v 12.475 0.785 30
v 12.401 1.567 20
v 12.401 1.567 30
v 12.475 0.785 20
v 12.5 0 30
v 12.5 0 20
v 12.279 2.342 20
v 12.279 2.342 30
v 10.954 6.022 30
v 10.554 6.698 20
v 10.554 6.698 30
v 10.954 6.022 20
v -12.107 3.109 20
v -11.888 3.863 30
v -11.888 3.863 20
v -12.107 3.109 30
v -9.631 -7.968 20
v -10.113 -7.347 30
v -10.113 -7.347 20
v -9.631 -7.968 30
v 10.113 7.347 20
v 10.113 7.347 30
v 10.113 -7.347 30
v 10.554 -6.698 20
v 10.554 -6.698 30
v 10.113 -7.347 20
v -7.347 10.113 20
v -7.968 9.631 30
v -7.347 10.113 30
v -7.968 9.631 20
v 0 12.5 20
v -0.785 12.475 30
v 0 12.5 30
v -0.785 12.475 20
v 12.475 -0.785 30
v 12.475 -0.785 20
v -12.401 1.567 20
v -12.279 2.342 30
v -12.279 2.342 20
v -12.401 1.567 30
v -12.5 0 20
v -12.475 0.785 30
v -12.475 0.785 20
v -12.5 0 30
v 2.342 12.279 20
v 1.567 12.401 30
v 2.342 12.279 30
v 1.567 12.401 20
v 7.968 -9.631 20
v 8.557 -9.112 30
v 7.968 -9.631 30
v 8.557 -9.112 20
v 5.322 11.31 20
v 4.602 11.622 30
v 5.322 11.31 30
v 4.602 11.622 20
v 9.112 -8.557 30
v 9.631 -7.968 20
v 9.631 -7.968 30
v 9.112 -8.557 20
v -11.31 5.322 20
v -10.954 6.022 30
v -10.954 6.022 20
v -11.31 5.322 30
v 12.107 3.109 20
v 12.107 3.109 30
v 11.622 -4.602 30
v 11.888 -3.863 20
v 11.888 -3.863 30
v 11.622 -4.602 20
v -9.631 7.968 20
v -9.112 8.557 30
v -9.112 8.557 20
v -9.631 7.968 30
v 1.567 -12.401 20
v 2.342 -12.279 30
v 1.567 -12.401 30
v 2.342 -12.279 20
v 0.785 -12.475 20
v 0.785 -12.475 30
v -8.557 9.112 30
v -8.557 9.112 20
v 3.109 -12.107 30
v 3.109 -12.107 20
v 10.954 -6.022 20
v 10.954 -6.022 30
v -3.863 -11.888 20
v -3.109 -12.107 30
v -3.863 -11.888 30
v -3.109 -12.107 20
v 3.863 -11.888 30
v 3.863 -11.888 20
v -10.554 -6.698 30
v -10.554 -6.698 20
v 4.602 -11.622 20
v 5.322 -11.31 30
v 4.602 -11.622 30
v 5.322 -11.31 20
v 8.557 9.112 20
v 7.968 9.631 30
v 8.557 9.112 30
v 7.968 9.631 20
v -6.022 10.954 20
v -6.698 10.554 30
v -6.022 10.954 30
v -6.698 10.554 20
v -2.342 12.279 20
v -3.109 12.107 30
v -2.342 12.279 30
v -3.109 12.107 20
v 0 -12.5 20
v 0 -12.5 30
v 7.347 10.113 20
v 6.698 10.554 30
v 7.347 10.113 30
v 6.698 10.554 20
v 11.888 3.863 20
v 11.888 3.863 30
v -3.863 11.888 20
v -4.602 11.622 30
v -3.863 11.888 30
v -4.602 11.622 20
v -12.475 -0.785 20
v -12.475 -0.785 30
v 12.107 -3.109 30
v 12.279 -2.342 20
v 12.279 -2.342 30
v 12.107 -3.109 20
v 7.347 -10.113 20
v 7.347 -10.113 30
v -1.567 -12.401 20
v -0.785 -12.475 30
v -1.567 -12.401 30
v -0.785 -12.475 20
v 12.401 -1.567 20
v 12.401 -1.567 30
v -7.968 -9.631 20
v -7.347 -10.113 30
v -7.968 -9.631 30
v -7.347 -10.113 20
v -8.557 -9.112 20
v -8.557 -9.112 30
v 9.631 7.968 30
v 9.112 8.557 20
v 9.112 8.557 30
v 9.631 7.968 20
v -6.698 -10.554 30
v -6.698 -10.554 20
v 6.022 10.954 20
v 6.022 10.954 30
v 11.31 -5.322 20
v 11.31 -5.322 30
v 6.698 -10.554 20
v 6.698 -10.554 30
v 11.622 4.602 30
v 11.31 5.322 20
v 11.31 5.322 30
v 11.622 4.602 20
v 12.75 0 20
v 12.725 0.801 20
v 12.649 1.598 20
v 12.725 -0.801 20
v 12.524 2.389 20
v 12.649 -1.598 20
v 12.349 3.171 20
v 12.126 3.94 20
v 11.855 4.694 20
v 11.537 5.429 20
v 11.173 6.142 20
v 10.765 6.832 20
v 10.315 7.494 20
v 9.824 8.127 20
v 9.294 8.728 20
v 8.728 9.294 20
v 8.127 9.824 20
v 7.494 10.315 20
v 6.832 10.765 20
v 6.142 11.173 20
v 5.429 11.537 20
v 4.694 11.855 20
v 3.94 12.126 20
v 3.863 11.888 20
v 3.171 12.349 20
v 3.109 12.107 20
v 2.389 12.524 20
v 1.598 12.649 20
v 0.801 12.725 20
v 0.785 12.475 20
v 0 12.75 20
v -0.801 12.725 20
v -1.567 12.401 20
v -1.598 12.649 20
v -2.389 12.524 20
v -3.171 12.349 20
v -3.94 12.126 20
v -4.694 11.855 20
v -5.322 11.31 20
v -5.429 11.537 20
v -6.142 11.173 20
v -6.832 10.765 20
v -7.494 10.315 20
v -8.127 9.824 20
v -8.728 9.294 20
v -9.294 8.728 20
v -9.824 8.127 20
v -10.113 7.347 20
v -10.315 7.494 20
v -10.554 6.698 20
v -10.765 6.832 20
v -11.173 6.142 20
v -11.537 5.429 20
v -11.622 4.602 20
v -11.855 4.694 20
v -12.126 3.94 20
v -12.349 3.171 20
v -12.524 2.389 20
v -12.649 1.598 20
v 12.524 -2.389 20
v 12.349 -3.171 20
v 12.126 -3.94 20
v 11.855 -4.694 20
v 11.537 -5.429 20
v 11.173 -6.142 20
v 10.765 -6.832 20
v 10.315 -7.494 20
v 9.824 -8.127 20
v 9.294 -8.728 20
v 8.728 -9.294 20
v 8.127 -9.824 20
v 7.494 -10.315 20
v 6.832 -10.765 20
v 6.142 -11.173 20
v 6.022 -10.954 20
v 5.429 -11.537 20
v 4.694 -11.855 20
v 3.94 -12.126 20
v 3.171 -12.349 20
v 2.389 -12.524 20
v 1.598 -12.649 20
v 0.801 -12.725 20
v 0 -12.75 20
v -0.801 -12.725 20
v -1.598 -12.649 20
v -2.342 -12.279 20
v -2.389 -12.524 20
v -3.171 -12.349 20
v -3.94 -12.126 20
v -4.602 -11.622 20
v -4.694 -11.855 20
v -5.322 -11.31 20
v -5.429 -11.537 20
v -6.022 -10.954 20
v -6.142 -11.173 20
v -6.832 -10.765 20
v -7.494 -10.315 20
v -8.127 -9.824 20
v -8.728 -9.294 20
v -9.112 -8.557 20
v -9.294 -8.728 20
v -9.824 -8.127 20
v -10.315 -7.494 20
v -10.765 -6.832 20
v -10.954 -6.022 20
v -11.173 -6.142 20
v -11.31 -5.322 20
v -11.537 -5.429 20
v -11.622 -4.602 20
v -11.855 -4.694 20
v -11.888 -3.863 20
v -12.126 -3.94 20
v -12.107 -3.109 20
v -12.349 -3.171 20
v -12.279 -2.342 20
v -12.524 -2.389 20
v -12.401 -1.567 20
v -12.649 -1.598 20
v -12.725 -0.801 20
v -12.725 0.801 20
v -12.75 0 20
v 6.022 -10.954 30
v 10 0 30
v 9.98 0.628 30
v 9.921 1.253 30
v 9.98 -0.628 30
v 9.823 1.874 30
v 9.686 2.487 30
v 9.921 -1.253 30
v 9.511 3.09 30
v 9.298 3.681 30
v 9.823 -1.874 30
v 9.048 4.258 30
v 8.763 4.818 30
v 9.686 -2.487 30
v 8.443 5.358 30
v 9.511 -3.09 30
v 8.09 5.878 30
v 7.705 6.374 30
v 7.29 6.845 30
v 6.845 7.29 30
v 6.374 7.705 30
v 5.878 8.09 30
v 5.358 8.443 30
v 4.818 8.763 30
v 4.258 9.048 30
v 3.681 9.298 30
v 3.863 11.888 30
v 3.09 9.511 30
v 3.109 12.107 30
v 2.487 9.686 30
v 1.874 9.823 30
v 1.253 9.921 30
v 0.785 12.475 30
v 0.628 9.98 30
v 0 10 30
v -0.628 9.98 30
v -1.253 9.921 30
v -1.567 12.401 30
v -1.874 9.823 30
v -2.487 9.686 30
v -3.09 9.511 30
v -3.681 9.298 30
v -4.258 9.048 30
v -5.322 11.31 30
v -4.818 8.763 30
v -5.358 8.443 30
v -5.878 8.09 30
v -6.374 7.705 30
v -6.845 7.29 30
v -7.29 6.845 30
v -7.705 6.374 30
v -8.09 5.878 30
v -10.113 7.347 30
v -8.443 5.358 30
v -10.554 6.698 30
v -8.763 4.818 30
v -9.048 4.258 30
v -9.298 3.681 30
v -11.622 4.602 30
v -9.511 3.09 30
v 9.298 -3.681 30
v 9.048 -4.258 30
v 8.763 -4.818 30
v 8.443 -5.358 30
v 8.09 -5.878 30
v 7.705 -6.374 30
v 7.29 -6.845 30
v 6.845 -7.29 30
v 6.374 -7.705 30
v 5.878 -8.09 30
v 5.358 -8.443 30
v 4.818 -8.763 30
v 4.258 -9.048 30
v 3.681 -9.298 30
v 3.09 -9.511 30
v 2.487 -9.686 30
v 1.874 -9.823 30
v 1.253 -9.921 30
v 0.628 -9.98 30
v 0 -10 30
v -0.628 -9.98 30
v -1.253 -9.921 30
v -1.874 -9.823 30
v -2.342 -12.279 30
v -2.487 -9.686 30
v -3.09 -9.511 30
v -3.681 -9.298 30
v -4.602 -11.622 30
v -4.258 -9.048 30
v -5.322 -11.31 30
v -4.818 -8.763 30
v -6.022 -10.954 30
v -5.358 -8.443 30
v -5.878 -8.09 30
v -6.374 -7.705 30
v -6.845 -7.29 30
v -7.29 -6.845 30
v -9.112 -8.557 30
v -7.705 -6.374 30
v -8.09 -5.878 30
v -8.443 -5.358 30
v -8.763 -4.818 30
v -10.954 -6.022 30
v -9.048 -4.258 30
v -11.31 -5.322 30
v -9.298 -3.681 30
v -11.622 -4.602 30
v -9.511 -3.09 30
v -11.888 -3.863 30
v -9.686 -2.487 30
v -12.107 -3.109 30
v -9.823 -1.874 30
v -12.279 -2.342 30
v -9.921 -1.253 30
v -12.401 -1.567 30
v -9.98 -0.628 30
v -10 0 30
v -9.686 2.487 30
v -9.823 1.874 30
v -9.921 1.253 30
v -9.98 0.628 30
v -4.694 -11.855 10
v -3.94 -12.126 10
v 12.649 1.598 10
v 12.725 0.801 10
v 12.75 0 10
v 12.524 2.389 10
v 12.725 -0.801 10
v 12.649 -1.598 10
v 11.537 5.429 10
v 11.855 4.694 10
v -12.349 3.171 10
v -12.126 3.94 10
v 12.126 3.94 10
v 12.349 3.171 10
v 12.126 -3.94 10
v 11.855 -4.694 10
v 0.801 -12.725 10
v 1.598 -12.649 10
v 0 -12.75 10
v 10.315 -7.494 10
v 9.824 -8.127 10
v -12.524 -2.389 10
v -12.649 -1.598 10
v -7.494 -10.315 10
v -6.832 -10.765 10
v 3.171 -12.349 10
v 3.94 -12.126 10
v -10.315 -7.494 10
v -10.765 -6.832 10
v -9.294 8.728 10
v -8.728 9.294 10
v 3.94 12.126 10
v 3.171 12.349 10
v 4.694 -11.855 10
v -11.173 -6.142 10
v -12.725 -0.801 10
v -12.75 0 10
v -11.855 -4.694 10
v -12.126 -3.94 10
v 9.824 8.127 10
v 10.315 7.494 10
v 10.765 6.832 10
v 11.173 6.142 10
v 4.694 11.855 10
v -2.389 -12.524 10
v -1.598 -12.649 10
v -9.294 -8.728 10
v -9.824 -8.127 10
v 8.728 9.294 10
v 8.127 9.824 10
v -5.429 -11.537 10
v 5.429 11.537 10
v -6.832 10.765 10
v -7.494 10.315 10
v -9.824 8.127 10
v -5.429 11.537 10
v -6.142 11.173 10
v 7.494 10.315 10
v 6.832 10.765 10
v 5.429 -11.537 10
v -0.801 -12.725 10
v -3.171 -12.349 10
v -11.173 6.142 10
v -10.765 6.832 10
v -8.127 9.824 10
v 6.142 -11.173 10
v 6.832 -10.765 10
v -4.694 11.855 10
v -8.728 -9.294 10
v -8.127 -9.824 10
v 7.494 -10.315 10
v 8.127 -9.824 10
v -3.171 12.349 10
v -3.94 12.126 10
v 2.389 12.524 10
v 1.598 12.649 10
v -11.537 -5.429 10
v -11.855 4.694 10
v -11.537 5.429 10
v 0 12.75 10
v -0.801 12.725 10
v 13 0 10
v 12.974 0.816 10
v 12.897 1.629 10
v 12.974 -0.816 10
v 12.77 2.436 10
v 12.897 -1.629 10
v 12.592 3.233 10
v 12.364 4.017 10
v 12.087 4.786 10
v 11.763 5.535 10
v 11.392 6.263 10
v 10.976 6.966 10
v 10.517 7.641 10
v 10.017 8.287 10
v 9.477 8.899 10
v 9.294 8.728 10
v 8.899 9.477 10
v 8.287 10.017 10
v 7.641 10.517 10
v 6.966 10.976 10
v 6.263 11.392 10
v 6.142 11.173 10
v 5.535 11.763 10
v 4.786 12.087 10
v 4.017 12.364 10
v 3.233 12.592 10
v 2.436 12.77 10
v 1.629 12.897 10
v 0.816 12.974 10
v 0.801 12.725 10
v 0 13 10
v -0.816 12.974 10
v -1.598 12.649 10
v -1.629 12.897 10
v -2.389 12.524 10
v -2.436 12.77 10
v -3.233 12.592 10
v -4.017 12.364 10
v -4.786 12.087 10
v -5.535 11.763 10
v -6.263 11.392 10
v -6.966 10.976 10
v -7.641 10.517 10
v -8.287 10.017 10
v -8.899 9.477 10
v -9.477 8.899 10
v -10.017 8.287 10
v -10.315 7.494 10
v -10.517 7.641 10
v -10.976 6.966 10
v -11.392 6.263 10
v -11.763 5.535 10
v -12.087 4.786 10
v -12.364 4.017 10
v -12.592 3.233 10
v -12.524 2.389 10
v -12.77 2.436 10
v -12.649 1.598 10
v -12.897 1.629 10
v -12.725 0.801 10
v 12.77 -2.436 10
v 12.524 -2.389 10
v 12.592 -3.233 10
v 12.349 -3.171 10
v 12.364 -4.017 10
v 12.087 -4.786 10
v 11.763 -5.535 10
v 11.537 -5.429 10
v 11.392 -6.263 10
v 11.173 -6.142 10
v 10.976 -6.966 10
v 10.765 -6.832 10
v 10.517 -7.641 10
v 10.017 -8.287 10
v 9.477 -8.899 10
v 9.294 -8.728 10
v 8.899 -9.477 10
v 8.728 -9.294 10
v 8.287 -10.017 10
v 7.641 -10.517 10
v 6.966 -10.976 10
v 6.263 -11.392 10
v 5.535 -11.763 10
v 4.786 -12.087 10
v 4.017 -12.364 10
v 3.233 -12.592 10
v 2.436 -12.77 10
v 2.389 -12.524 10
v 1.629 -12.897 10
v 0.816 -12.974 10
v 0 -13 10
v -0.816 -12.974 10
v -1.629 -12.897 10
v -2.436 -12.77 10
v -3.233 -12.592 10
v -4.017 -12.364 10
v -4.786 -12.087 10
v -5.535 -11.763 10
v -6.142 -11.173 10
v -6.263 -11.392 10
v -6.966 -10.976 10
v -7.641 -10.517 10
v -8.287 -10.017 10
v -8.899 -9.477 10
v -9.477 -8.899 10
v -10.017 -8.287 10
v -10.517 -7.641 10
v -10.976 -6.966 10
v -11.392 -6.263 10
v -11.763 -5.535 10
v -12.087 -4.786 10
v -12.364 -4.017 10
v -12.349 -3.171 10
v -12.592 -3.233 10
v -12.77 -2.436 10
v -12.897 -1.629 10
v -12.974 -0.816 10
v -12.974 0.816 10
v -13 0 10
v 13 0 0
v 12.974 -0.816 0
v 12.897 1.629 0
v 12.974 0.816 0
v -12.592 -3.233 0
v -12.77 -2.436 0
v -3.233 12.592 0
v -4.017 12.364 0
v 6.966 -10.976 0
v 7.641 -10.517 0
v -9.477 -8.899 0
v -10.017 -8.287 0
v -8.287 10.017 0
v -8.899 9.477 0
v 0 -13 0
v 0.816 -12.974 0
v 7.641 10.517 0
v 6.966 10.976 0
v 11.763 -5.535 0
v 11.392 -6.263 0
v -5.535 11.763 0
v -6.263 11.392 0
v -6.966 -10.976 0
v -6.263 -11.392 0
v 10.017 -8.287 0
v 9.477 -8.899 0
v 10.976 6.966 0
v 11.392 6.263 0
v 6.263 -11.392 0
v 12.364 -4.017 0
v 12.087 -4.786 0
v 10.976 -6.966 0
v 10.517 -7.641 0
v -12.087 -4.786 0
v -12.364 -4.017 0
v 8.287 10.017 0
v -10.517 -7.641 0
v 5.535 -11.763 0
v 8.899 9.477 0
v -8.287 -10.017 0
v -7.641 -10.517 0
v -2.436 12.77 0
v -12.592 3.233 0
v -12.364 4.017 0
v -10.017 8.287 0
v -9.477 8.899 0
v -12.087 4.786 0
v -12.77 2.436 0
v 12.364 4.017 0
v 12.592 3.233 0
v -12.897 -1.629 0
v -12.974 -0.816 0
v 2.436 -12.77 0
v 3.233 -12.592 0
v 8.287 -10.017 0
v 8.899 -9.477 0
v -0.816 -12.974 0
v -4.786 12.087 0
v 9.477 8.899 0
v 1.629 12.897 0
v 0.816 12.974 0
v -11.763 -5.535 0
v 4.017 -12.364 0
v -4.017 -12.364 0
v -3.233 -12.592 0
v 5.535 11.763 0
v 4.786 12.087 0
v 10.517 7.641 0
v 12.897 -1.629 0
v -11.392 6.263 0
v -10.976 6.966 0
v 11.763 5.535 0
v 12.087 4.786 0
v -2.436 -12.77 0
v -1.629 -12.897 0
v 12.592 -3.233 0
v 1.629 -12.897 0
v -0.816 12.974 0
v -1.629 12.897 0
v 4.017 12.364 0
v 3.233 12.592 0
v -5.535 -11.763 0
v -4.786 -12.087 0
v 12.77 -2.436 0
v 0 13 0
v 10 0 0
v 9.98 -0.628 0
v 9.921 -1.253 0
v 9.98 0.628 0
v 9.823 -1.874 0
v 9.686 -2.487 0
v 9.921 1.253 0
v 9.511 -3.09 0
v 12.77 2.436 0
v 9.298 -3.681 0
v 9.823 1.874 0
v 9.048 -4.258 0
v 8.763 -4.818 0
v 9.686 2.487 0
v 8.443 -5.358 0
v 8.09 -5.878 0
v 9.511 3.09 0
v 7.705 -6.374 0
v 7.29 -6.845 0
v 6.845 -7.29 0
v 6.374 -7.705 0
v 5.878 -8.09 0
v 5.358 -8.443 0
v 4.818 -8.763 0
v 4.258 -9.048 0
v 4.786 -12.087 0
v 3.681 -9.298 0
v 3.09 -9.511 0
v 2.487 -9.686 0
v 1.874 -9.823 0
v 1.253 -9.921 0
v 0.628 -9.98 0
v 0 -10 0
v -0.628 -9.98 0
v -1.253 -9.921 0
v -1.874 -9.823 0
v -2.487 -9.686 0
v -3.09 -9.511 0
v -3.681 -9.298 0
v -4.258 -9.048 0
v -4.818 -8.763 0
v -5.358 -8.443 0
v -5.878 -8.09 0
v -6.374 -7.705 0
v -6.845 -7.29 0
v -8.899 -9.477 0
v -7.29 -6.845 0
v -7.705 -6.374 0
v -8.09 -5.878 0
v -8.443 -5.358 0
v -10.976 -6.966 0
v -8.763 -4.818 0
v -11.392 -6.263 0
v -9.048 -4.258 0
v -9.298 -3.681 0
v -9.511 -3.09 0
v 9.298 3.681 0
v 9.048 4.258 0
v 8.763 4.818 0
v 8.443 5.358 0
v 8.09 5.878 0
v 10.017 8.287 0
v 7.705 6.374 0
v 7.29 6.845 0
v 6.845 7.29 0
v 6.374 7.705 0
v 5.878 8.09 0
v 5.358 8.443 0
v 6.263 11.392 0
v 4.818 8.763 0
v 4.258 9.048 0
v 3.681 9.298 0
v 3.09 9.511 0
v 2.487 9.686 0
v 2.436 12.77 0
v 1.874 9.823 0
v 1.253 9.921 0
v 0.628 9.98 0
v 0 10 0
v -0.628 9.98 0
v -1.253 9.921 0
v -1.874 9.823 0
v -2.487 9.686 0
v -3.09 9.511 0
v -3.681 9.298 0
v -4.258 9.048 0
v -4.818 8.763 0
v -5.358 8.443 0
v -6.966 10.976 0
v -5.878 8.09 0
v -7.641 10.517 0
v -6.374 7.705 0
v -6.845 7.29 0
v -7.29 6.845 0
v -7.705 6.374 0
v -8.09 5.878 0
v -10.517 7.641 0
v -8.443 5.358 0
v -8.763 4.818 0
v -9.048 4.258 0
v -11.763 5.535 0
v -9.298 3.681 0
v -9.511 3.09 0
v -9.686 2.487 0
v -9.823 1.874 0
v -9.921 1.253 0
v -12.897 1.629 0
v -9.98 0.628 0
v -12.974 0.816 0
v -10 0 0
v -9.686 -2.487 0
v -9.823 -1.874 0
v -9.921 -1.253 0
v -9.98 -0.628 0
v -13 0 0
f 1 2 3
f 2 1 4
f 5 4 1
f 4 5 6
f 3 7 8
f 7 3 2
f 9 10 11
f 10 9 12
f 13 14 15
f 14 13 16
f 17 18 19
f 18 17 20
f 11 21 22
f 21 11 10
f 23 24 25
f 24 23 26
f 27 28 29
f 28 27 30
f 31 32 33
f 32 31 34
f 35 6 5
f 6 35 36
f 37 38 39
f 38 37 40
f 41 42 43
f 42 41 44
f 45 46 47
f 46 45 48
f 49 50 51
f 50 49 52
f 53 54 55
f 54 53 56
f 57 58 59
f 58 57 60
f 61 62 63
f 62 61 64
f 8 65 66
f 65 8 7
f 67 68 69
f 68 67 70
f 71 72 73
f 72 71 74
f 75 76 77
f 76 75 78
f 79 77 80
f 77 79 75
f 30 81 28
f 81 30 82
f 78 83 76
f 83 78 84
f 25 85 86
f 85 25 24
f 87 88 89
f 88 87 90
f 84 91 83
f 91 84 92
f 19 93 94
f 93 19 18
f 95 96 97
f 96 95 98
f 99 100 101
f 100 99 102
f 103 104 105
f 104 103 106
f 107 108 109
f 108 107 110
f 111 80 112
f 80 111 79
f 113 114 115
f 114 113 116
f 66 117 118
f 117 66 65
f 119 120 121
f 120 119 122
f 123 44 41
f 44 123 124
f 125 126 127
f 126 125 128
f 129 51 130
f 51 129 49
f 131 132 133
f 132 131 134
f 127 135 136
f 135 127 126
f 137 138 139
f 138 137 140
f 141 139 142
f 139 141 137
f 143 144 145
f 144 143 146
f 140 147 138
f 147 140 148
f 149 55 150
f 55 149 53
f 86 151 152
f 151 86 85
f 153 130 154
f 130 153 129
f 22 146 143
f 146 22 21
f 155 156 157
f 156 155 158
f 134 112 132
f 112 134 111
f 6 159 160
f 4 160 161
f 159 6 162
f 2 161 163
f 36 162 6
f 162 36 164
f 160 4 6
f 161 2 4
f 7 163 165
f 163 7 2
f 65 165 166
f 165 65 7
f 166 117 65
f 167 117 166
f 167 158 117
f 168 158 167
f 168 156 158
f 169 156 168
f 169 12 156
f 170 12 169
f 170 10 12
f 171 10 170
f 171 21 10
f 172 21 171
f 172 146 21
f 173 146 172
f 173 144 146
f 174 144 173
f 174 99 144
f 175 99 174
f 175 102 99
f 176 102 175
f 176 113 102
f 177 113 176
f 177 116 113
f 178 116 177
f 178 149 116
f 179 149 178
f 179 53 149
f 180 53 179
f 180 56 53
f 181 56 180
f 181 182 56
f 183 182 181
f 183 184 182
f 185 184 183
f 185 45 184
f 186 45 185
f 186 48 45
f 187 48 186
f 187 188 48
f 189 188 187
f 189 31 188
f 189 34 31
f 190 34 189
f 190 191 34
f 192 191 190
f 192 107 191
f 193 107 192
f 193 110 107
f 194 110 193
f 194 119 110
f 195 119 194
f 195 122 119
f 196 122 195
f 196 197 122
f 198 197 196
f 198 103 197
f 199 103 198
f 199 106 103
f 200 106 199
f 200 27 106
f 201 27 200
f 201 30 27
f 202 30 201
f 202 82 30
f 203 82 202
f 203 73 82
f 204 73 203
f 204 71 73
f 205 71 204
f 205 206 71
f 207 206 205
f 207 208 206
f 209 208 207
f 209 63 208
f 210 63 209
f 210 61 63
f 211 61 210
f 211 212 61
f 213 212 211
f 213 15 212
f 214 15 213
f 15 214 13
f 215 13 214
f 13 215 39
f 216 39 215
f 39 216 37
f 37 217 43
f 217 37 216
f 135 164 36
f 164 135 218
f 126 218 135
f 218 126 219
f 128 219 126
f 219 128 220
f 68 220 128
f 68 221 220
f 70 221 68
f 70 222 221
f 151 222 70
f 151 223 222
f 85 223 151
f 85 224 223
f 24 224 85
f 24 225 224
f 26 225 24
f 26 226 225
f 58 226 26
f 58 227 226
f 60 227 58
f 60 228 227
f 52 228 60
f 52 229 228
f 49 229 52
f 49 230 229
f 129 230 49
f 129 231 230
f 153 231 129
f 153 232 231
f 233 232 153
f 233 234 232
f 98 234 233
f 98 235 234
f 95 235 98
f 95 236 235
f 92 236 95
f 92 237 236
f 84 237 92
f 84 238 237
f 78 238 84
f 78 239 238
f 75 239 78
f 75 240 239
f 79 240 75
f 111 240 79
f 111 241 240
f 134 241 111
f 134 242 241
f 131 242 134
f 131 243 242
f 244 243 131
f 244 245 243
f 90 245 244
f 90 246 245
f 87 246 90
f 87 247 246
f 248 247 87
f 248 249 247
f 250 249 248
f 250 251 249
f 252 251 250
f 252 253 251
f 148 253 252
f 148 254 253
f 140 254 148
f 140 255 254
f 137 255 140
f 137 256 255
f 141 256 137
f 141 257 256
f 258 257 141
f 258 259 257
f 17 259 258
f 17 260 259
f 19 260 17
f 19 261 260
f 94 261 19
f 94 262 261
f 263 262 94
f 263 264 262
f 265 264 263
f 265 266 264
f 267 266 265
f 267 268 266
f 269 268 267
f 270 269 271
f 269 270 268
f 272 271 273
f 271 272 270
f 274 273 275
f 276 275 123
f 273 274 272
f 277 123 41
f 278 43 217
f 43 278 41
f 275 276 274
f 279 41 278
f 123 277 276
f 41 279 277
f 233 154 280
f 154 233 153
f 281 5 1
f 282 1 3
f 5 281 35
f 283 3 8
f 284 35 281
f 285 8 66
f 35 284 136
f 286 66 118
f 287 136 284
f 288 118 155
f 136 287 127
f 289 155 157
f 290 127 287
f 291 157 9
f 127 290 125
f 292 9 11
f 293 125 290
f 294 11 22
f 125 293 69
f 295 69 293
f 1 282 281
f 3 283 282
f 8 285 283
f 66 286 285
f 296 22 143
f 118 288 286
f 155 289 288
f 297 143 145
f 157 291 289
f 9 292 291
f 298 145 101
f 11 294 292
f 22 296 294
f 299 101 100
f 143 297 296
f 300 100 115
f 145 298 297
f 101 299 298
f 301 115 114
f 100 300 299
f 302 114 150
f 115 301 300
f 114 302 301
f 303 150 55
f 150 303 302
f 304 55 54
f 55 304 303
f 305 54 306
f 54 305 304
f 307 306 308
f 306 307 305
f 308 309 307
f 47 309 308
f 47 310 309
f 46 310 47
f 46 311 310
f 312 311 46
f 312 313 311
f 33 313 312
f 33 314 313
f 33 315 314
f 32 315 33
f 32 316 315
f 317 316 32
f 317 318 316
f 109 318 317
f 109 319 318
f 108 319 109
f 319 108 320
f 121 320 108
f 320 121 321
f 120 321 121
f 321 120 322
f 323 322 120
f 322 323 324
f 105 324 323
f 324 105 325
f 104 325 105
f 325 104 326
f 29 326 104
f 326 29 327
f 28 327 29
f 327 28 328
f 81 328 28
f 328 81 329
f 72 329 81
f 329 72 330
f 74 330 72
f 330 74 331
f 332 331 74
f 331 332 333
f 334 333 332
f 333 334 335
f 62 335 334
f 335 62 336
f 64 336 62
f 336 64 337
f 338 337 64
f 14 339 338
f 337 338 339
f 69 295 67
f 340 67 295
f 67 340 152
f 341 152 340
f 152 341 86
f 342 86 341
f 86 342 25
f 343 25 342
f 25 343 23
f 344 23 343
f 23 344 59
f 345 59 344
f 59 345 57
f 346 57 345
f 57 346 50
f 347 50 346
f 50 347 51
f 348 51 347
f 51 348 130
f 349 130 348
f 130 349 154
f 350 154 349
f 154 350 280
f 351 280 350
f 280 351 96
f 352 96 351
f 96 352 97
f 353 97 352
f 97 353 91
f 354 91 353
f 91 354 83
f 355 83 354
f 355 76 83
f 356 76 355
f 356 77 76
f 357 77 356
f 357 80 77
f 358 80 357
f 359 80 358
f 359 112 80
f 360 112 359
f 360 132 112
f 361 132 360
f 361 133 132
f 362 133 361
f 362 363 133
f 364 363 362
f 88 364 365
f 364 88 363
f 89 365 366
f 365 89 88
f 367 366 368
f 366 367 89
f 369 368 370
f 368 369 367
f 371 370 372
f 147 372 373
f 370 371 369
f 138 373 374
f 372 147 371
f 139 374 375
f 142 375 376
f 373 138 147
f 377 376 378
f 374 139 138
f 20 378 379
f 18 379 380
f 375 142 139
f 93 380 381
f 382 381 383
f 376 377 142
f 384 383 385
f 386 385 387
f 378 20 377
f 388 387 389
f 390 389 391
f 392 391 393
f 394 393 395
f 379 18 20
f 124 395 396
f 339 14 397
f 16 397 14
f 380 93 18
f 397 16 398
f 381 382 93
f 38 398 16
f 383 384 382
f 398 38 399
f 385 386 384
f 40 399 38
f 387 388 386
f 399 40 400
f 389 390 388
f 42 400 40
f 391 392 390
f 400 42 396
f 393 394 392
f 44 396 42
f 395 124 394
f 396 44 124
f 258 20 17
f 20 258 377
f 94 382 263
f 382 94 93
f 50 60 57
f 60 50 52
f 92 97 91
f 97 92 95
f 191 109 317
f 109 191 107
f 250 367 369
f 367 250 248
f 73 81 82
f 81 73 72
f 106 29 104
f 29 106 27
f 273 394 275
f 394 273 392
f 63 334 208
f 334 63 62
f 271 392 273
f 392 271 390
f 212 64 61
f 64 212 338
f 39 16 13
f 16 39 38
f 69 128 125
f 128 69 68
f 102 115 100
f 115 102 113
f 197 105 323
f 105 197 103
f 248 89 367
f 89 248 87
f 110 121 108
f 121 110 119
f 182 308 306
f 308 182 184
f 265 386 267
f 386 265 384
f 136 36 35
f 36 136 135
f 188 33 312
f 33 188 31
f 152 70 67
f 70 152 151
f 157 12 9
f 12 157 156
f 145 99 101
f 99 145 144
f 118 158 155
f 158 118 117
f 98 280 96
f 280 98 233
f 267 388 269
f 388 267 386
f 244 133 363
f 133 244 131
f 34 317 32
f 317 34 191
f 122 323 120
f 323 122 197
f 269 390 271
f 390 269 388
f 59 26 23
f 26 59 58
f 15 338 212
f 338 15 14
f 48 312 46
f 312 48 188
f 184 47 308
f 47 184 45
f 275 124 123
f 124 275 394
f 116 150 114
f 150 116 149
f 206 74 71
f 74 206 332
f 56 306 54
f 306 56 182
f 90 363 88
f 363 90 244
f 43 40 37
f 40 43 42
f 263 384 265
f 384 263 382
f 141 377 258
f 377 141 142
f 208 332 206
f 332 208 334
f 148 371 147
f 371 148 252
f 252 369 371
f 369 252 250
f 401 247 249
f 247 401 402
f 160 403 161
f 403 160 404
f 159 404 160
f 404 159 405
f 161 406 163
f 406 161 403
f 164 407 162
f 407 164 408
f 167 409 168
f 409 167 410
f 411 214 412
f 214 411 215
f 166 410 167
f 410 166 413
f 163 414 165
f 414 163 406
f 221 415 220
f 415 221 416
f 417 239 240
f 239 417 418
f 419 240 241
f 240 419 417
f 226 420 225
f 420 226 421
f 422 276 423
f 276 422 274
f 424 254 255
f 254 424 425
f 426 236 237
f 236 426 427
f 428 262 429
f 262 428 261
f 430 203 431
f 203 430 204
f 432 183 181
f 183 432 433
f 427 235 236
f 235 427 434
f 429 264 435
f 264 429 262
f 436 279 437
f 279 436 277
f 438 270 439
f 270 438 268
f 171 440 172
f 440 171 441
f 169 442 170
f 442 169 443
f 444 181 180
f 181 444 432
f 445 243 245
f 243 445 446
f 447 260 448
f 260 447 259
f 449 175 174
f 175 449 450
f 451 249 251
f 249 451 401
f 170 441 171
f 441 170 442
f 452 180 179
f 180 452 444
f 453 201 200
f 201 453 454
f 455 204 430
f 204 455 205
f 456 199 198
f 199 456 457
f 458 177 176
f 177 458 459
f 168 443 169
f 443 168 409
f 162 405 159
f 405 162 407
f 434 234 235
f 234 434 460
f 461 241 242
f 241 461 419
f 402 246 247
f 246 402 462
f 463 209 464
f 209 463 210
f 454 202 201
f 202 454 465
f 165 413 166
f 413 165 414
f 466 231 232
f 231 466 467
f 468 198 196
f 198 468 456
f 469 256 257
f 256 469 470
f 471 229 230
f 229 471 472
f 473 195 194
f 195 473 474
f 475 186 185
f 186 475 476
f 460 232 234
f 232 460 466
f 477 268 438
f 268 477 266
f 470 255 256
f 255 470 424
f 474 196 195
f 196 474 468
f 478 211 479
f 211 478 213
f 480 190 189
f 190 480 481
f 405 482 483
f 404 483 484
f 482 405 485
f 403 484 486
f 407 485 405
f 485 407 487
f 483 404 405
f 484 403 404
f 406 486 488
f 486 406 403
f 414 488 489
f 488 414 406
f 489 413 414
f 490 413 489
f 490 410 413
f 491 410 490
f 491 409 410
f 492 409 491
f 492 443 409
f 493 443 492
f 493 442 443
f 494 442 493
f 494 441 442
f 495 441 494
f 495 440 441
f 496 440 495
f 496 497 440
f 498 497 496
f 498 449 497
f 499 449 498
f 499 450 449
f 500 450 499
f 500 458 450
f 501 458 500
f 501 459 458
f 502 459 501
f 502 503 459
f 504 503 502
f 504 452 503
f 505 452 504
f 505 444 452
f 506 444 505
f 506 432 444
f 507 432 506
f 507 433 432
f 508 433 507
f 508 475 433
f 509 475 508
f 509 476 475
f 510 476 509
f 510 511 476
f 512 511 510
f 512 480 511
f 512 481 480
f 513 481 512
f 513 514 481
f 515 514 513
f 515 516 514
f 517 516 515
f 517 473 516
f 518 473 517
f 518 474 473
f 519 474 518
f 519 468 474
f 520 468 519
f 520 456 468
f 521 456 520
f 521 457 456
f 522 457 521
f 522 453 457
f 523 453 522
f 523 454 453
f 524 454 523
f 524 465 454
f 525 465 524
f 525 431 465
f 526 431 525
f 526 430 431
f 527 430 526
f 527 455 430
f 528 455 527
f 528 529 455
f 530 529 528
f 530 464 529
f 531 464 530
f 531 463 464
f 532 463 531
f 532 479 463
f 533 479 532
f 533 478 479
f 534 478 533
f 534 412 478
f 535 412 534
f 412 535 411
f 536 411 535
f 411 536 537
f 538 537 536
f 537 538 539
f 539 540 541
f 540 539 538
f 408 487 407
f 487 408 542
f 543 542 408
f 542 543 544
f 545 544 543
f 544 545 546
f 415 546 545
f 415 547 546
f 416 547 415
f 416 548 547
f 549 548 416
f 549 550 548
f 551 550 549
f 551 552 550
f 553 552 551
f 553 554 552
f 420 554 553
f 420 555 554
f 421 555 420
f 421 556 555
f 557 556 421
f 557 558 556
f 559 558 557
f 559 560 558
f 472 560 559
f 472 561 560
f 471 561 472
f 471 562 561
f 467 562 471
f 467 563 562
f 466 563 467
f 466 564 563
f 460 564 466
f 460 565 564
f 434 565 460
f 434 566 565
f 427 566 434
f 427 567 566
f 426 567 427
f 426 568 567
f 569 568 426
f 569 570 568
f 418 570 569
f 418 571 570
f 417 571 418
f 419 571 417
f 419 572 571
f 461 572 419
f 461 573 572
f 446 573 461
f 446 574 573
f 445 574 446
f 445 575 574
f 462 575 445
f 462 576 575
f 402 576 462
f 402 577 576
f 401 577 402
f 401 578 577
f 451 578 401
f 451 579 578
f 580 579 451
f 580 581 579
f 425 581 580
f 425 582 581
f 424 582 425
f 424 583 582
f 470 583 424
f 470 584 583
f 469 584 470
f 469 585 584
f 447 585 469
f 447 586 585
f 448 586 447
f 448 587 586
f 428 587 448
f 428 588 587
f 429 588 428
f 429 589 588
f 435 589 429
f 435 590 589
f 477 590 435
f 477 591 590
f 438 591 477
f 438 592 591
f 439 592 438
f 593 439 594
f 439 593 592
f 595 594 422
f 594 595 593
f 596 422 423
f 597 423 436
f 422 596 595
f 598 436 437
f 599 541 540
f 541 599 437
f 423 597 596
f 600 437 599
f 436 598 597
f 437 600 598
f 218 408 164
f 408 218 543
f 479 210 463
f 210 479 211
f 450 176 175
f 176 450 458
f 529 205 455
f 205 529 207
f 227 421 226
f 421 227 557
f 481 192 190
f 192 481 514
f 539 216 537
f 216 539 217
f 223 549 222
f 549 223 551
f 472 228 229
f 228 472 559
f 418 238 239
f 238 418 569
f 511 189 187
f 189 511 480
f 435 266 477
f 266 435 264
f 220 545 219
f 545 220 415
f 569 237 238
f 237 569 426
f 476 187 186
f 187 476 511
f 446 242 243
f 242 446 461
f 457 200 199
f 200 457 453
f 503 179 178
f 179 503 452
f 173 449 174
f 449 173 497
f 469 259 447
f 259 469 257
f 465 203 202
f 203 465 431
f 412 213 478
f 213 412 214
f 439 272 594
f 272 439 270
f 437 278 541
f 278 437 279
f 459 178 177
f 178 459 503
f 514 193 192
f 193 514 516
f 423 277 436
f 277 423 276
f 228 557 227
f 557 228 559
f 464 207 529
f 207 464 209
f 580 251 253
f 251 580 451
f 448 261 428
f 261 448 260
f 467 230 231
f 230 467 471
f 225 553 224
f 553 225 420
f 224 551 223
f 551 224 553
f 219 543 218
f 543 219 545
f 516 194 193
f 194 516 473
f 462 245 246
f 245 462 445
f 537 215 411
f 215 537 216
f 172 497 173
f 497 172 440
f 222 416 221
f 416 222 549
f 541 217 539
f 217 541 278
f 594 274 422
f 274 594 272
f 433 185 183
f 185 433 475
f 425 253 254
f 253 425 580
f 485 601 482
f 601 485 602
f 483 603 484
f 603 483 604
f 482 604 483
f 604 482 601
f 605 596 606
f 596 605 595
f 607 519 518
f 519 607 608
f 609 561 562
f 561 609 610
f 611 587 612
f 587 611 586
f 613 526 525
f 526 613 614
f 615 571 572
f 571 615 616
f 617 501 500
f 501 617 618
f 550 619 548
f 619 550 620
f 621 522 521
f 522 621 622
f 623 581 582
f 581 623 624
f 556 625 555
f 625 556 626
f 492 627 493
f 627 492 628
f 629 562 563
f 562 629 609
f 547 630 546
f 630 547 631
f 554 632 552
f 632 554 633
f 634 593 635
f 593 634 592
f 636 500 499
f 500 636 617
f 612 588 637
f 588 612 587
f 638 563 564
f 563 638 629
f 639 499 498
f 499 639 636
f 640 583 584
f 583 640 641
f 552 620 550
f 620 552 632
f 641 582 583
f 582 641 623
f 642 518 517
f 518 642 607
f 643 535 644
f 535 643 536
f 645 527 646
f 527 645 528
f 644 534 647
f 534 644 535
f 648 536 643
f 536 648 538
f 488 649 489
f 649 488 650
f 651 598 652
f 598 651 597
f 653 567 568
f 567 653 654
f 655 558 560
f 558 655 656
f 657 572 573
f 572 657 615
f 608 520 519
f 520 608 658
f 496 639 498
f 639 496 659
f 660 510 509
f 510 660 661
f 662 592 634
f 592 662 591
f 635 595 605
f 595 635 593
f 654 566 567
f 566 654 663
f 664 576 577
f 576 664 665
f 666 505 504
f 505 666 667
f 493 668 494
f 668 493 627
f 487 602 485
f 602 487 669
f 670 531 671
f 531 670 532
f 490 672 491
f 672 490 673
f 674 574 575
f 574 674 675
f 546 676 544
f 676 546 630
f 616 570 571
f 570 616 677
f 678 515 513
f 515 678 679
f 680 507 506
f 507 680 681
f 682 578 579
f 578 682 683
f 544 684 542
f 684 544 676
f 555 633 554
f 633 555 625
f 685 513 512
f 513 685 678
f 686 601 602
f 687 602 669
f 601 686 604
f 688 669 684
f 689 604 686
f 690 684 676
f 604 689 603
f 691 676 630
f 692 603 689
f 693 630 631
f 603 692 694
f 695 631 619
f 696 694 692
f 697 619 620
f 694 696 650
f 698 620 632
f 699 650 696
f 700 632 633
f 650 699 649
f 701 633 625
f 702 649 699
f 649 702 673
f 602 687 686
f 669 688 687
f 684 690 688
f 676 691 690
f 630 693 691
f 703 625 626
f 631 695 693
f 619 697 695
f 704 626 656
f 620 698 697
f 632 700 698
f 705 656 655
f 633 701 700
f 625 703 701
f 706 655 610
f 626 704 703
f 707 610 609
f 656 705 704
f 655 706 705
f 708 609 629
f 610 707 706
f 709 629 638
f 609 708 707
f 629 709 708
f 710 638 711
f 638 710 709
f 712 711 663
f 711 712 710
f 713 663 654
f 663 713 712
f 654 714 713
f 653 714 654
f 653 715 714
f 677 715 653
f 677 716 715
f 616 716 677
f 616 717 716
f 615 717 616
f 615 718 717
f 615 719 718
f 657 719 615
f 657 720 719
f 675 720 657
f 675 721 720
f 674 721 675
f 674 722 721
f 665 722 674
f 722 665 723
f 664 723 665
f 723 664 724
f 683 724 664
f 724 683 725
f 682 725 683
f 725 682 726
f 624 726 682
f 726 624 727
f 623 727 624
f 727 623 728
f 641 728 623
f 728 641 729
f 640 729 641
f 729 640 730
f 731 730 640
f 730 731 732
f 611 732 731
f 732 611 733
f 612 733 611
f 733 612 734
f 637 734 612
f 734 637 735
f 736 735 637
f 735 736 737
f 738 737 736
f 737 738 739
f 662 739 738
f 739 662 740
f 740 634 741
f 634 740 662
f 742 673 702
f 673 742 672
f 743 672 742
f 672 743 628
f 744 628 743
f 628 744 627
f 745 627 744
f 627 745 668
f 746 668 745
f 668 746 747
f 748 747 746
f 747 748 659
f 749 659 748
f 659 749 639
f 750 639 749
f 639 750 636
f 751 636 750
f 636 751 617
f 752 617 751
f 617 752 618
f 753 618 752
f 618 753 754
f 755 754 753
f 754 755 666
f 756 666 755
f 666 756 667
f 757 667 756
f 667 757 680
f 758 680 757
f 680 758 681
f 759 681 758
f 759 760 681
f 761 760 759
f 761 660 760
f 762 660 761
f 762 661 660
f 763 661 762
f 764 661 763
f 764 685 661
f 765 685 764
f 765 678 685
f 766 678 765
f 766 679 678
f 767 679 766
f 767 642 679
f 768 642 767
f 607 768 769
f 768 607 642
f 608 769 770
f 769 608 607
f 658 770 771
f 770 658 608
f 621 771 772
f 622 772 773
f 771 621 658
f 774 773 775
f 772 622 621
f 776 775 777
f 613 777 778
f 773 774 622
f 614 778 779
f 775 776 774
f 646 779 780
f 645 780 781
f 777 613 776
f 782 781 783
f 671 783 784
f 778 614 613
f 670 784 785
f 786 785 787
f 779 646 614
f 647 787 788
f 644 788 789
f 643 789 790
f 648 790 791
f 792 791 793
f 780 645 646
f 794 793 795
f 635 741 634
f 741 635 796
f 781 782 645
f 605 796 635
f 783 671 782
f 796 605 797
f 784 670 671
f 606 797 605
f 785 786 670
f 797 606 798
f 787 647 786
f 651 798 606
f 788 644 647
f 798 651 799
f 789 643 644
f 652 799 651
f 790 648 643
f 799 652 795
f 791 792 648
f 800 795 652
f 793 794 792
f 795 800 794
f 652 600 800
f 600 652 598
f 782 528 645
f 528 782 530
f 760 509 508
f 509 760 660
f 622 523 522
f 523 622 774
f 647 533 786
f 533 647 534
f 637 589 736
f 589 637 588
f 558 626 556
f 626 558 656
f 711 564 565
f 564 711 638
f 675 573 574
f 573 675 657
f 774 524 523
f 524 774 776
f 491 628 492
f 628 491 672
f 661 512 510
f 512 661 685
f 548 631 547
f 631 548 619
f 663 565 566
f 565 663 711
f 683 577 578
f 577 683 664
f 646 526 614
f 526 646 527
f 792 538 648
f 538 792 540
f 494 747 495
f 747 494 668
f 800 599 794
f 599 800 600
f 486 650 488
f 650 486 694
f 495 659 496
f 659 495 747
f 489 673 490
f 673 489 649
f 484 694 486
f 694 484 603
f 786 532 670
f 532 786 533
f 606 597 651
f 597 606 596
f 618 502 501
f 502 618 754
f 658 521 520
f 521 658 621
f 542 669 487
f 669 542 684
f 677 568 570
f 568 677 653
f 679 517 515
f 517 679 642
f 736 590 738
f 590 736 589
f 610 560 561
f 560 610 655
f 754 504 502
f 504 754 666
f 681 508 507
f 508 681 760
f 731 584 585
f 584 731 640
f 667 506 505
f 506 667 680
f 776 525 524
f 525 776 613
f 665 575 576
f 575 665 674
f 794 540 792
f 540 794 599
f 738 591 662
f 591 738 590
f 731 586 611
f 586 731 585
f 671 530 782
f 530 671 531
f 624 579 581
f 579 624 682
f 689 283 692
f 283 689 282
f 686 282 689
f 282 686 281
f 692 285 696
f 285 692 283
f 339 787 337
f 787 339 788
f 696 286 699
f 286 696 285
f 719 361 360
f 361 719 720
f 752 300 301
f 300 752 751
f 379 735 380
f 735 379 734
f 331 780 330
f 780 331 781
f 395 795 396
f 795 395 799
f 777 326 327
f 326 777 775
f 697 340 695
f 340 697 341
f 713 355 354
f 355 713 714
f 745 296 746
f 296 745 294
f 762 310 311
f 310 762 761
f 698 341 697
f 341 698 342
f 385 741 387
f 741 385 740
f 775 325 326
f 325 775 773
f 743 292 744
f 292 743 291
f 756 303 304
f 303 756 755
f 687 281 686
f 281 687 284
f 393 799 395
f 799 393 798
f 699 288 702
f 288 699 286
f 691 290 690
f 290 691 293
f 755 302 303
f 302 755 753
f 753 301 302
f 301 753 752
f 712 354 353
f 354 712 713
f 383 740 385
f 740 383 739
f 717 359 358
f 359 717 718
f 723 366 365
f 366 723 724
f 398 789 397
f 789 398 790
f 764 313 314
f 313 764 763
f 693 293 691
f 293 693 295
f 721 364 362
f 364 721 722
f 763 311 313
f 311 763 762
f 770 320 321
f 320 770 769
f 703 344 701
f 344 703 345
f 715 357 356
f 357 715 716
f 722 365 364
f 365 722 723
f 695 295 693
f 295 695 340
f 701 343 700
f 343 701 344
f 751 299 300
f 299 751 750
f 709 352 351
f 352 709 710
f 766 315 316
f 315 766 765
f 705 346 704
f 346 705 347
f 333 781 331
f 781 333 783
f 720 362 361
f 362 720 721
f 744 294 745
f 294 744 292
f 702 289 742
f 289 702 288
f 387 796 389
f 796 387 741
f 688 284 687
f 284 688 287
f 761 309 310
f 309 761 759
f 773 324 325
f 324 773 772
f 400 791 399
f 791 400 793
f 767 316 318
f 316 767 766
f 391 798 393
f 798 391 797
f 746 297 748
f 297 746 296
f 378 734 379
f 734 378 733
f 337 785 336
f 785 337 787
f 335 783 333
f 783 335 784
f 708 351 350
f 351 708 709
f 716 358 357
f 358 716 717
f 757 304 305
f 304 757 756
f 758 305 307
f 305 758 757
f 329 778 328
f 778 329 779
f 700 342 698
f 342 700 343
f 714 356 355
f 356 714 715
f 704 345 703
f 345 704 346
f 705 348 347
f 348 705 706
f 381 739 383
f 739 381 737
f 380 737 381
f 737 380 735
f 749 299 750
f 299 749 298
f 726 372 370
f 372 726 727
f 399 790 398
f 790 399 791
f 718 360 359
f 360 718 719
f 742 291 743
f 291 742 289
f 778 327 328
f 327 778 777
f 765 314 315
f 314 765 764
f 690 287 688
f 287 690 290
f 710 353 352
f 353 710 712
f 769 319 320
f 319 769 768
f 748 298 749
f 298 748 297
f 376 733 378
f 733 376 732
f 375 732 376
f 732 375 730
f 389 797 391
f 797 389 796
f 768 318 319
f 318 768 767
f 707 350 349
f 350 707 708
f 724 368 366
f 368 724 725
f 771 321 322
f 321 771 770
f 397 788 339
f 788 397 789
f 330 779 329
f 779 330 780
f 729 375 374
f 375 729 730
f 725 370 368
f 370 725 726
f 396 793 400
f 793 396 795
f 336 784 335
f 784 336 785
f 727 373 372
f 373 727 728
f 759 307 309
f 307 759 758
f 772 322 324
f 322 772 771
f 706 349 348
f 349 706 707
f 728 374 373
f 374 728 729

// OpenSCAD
// cylinder inserts to test out omnium rack
// ID of rack tube are 25-26 mm 

$fn=100;

difference()
{

union(){
// 25 mm outer diameter
translate([0,0,20])
{
cylinder(h=10, r=25/2);
}

// 25.5 mm outer diameter
translate([0,0,10])
{
cylinder(h=10, r=25.5/2);
}

// 26 mm od
cylinder(h=10, r=26/2);


}

cylinder(h=30, r=20/2);
}
